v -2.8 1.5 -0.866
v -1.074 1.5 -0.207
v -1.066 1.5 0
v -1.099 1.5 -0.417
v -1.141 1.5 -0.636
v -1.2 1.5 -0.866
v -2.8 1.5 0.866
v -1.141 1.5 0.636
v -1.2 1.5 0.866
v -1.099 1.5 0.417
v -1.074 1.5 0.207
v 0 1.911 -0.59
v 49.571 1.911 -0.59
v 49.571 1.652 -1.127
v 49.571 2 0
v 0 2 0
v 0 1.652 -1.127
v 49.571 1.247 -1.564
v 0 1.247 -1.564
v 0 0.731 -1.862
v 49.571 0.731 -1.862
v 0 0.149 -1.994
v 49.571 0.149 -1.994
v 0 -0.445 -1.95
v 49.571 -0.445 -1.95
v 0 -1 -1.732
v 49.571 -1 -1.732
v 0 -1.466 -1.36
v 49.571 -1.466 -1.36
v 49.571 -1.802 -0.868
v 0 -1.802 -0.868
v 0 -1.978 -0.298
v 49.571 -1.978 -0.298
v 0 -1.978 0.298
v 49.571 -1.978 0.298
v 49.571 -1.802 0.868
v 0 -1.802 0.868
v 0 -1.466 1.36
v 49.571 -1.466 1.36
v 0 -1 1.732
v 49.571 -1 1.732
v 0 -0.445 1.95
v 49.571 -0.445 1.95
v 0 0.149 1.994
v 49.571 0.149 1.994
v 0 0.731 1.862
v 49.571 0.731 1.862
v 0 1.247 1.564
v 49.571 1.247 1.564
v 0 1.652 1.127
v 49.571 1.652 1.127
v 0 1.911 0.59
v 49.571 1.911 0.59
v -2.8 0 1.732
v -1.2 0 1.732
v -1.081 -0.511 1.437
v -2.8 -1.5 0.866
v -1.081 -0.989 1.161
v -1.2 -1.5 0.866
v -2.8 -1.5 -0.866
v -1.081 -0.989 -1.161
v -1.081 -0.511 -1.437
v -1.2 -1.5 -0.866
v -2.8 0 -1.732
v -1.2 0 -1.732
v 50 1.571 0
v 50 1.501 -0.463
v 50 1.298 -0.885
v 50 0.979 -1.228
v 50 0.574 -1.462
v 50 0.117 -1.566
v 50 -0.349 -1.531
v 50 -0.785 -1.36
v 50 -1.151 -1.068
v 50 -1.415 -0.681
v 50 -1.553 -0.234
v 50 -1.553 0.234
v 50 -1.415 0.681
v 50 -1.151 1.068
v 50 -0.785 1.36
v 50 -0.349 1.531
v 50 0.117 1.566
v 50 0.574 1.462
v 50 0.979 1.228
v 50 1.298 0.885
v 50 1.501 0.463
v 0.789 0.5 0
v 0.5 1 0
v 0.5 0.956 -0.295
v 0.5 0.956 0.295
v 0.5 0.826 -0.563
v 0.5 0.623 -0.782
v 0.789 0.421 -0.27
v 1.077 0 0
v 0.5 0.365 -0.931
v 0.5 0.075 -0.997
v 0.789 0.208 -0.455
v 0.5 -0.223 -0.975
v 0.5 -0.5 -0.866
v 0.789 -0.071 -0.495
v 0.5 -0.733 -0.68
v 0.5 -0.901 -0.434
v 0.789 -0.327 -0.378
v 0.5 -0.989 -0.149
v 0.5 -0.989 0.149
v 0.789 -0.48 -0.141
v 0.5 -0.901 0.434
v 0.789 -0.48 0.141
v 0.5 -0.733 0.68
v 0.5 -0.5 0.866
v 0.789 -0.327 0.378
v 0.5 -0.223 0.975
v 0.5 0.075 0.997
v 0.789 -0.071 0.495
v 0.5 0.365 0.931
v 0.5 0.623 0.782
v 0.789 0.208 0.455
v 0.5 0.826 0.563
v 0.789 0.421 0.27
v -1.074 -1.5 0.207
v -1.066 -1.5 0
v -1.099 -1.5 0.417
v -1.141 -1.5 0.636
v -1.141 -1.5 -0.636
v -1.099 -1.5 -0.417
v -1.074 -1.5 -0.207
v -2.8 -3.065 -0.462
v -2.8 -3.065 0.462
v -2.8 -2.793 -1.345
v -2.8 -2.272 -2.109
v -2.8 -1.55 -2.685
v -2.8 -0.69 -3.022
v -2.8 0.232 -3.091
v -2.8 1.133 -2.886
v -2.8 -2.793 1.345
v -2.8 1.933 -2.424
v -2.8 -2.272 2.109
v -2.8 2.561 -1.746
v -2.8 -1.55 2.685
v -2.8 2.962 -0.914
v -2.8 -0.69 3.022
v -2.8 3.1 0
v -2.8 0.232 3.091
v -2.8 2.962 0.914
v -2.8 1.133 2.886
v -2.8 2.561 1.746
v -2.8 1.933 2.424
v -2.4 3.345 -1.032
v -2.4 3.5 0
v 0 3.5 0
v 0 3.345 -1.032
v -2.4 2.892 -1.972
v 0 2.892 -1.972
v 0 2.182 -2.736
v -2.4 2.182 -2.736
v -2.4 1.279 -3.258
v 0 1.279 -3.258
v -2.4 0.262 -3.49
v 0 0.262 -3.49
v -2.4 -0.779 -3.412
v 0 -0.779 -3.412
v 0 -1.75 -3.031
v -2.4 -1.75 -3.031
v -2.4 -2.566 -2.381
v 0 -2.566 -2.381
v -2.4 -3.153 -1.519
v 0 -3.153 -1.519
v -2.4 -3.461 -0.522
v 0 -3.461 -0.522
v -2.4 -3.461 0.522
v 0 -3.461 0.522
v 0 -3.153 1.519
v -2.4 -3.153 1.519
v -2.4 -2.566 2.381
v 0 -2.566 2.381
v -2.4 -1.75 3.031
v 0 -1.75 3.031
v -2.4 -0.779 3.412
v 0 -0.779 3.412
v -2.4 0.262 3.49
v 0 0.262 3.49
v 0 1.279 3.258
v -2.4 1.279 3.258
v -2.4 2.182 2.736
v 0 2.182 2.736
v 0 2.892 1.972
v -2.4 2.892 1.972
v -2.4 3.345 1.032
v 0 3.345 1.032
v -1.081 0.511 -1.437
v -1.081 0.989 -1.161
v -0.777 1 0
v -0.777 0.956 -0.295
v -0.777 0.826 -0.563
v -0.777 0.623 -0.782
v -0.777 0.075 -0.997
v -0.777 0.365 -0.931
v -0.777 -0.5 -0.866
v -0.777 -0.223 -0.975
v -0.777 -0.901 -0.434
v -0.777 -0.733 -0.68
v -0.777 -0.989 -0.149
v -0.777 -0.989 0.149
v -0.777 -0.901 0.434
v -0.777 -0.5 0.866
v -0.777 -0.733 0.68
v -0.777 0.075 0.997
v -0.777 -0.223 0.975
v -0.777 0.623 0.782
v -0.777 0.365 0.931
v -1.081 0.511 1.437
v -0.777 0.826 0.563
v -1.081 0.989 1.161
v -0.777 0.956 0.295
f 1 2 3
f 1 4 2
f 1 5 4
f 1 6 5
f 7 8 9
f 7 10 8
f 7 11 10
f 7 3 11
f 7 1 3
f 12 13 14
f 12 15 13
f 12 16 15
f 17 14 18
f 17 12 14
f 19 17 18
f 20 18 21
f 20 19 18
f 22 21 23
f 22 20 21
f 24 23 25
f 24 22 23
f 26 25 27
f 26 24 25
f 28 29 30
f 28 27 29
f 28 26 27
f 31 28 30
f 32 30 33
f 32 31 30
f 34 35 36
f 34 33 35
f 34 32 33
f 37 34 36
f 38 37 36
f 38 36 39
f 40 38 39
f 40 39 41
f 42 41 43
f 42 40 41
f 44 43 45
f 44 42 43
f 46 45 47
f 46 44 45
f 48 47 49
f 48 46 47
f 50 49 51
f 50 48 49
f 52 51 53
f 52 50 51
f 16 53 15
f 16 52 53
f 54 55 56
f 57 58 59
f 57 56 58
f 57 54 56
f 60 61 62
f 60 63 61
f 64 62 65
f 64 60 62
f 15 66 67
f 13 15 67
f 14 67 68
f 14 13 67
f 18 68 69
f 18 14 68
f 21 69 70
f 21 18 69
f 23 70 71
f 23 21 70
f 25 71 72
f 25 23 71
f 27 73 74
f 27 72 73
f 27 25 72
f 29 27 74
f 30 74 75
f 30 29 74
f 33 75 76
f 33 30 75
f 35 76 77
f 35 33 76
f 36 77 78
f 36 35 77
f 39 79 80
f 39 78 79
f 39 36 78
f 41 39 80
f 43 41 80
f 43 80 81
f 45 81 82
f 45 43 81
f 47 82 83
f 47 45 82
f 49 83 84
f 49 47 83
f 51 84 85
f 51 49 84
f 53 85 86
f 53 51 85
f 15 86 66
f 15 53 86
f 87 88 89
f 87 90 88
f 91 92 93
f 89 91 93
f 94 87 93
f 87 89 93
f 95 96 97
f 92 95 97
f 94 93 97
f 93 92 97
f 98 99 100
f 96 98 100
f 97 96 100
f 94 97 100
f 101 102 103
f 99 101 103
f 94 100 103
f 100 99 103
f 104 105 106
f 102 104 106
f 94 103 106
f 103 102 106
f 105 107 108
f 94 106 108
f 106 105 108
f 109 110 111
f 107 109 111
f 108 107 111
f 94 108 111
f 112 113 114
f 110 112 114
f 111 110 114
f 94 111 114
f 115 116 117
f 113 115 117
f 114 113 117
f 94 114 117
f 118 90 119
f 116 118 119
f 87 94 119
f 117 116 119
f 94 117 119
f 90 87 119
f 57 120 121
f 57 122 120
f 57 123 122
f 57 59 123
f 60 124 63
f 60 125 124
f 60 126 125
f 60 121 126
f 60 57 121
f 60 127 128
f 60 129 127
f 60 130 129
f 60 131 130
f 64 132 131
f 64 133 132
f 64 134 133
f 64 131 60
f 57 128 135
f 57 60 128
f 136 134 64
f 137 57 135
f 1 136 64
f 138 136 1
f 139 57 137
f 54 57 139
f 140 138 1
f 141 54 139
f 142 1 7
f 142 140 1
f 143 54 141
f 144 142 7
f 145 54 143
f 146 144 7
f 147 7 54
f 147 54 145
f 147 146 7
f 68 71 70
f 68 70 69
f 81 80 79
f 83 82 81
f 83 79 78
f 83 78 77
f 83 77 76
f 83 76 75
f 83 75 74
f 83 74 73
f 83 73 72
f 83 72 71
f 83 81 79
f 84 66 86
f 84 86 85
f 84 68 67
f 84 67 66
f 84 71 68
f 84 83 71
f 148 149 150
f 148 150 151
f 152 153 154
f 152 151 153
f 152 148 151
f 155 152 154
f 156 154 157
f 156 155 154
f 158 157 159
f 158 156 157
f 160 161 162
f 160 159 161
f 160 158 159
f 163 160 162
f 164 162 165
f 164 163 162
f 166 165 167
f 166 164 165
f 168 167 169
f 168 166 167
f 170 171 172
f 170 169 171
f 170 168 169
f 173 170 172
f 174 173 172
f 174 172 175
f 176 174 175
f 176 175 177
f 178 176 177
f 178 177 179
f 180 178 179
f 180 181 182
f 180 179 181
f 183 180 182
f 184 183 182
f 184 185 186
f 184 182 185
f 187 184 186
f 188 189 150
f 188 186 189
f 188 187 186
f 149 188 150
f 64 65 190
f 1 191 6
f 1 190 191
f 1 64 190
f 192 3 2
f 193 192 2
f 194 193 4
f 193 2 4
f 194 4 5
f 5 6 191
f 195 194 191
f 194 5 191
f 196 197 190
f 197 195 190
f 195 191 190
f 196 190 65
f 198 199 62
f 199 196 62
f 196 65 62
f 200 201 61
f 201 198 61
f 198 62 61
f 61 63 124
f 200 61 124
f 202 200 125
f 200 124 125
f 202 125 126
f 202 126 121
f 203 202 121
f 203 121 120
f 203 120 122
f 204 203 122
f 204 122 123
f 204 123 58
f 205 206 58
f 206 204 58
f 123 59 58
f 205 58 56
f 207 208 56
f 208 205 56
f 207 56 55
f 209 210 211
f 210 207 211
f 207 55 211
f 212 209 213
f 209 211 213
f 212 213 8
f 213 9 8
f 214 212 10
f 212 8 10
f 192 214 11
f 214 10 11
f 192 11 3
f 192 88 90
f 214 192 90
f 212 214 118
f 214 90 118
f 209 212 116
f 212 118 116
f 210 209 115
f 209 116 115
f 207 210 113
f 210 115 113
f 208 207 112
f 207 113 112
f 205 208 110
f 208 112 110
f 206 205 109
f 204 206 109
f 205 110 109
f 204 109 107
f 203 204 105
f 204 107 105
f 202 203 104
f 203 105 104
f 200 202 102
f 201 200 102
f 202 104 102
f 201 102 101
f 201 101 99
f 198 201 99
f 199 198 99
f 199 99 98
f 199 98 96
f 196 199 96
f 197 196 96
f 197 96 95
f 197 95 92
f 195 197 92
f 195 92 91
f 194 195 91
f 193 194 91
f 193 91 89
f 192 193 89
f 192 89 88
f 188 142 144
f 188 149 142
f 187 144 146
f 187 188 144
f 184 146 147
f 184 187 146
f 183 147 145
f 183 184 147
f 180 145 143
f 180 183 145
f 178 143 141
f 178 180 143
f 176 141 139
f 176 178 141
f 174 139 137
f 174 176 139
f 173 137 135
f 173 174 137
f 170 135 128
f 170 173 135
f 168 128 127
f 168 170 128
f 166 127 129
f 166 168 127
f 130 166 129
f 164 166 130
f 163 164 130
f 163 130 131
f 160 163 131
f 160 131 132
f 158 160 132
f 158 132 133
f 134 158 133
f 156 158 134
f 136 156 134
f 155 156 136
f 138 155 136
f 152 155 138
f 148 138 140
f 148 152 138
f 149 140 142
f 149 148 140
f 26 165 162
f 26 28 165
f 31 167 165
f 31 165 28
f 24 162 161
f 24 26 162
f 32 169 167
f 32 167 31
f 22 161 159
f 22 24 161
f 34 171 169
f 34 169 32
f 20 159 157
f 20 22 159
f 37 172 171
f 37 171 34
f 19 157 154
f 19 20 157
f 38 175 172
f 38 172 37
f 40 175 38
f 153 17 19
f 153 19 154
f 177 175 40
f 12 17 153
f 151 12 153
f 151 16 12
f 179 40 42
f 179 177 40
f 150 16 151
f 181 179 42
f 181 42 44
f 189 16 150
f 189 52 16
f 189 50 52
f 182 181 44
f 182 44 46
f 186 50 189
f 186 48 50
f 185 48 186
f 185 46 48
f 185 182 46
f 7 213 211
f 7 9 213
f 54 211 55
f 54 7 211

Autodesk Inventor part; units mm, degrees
ref_plane "YZ Plane" through (0, 0, 0) normal (1, 0, 0) x (0, 1, 0)
ref_plane "XZ Plane" through (0, 0, 0) normal (0, 1, 0) x (-1, 0, 0)
sketch "Sketch1" plane through (0, 0, 0) normal (0, 0, 1) x (1, 0, 0)
  line L0 (1.0774, 0) -> (50, 0)
  line L1 (50, 0) -> (50, 2)
  line L2 (50, 2) -> (0, 2)
  line L3 (0, 2) -> (0, 3.5)
  line L4 (0, 3.5) -> (-2.8, 3.5)
  line L5 (-2.8, 3.5) -> (-2.8, 1.7321)
  line L6 (-2.8, 1.7321) -> (-1.2, 1.7321)
  line L7 (-1.2, 1.7321) -> (-0.7774, 1)
  line L8 (-13.36, 0) -> (60.56, 0) projected
  line L9 (0, -0.7) -> (0, 4.2) projected
  line L10 (-0.7774, 1) -> (0.5, 1)
  line L11 (0.5, 1) -> (1.0774, 0)
  line L12 (-2.8, 1.7321) -> (-2.8, 0) construction
  line L13 (-2.8, 3.1) -> (-2.4, 3.5)
  dimension "d0" = 2.8
  dimension "d1" = 1.6
  dimension "d2" = 60
  dimension "d3" = 4
  dimension "d4" = 3.4641
  dimension "d5" = 7
  dimension "d15" = 3.3
  dimension "d16" = 2
  dimension "d17" = 50
  dimension "d32" = 45
  dimension "d33" = 0.4
revolve "Body" add sketch "Sketch1" angle 360 about axis through (1.0774, 0, 0) along (1, 0, 0) contours L11 L10 L9 L2 L1 L0 | L10 L7 L6 L5 L13 L4 L3 L9 | L13 L5 L4
revolve "Chamfer2" cut sketch "Sketch1" angle 360 about axis through (-10, 0, 0) along (1, 0, 0) contours L13 L5 L4
sketch "Sketch2" plane through (-2.8, 0, 0) normal (-1, 0, 0) x (0, 0, 1)
  circle A0 centre (0, 0) radius 1.7321 projected
  line L0 (0, -4.9) -> (0, 4.9) projected
  line L1 (-4.9, 0) -> (4.9, 0) projected
  line L2 (1.7321, 0) -> (0.866, -1.5)
  line L3 (0.866, -1.5) -> (-0.866, -1.5)
  line L4 (-0.866, -1.5) -> (-1.7321, 0)
  line L5 (-1.7321, 0) -> (-0.866, 1.5)
  line L6 (-0.866, 1.5) -> (0.866, 1.5)
  line L7 (0.866, 1.5) -> (1.7321, 0)
extrude "Slot" add sketch "Sketch2" against normal up to next contours L7 A0 | A0 L2 | L6 L0 A0 | A0 L0 L3 | L0 L6 A0 | A0 L3 L0 | L4 A0 | A0 L5
thread "Thread" size "M4x0.7" class "6g" standard "ISO Metric profile" length 14
chamfer "Chamfer1" distance 0.4294 distance2 0.4294 1 edges at (50, -2, 0) measured on face at (50, -0.8158, 0.4805)
ref_plane "Work Plane1" through (25, 0, 0) normal (0, 0.5, 0.866) x (1, 0, 0)
equation "\"d0\" = KOH"
equation "\"d1\" = INTI"
equation "\"d3\" = GD"
equation "\"d4\" = 1.1547 * SW"
equation "\"d5\" = KOD"
equation "\"d15\" = INFT"
equation "\"d16\" = SDT"
equation "\"d17\" = NLG"
equation "\"d33\" = Cham"
equation "\"d7\" = GEL"
equation "\"d9\" = -0.5 * SPD + 0.5 * GD"
equation "\"d12\" = GUL"
equation "\"GD\" = NND"
equation "\"NLG\" = 50"
equation "\"GEL\" = 14"
equation "\"KOD\" = 7"
equation "\"KOH\" = 2.8"
equation "\"GUL\" = 0.61345 * PTC"
equation "\"SW\" = 3"
equation "\"INTI\" = 1.6"
equation "\"SPD\" = NND - 1.2269 * PTC"
equation "\"SDT\" = 2"
equation "\"INFT\" = 3.3"
equation "\"Cham\" = 0.4"
equation "\"TOA\" = 30deg"
equation "\"GD1\" = THREADDIA - 1.2269 * PTC"
equation "\"THREADDIA\" = 4"
equation "\"BDM\" = NND"
equation "\"FAWI\" = 45deg"
equation "\"RR\" = 0.1 * NND"
equation "\"PTC\" = 0.7"
equation "\"NND\" = 4"
equation "\"FAWI1\" = 45deg"
equation "\"GAL\" = 0.61345 * PTC"
equation "\"E0\" = 1.155 * SW"
properties part number "DIN 6912 - M4 x 50" material "Steel, Mild"
